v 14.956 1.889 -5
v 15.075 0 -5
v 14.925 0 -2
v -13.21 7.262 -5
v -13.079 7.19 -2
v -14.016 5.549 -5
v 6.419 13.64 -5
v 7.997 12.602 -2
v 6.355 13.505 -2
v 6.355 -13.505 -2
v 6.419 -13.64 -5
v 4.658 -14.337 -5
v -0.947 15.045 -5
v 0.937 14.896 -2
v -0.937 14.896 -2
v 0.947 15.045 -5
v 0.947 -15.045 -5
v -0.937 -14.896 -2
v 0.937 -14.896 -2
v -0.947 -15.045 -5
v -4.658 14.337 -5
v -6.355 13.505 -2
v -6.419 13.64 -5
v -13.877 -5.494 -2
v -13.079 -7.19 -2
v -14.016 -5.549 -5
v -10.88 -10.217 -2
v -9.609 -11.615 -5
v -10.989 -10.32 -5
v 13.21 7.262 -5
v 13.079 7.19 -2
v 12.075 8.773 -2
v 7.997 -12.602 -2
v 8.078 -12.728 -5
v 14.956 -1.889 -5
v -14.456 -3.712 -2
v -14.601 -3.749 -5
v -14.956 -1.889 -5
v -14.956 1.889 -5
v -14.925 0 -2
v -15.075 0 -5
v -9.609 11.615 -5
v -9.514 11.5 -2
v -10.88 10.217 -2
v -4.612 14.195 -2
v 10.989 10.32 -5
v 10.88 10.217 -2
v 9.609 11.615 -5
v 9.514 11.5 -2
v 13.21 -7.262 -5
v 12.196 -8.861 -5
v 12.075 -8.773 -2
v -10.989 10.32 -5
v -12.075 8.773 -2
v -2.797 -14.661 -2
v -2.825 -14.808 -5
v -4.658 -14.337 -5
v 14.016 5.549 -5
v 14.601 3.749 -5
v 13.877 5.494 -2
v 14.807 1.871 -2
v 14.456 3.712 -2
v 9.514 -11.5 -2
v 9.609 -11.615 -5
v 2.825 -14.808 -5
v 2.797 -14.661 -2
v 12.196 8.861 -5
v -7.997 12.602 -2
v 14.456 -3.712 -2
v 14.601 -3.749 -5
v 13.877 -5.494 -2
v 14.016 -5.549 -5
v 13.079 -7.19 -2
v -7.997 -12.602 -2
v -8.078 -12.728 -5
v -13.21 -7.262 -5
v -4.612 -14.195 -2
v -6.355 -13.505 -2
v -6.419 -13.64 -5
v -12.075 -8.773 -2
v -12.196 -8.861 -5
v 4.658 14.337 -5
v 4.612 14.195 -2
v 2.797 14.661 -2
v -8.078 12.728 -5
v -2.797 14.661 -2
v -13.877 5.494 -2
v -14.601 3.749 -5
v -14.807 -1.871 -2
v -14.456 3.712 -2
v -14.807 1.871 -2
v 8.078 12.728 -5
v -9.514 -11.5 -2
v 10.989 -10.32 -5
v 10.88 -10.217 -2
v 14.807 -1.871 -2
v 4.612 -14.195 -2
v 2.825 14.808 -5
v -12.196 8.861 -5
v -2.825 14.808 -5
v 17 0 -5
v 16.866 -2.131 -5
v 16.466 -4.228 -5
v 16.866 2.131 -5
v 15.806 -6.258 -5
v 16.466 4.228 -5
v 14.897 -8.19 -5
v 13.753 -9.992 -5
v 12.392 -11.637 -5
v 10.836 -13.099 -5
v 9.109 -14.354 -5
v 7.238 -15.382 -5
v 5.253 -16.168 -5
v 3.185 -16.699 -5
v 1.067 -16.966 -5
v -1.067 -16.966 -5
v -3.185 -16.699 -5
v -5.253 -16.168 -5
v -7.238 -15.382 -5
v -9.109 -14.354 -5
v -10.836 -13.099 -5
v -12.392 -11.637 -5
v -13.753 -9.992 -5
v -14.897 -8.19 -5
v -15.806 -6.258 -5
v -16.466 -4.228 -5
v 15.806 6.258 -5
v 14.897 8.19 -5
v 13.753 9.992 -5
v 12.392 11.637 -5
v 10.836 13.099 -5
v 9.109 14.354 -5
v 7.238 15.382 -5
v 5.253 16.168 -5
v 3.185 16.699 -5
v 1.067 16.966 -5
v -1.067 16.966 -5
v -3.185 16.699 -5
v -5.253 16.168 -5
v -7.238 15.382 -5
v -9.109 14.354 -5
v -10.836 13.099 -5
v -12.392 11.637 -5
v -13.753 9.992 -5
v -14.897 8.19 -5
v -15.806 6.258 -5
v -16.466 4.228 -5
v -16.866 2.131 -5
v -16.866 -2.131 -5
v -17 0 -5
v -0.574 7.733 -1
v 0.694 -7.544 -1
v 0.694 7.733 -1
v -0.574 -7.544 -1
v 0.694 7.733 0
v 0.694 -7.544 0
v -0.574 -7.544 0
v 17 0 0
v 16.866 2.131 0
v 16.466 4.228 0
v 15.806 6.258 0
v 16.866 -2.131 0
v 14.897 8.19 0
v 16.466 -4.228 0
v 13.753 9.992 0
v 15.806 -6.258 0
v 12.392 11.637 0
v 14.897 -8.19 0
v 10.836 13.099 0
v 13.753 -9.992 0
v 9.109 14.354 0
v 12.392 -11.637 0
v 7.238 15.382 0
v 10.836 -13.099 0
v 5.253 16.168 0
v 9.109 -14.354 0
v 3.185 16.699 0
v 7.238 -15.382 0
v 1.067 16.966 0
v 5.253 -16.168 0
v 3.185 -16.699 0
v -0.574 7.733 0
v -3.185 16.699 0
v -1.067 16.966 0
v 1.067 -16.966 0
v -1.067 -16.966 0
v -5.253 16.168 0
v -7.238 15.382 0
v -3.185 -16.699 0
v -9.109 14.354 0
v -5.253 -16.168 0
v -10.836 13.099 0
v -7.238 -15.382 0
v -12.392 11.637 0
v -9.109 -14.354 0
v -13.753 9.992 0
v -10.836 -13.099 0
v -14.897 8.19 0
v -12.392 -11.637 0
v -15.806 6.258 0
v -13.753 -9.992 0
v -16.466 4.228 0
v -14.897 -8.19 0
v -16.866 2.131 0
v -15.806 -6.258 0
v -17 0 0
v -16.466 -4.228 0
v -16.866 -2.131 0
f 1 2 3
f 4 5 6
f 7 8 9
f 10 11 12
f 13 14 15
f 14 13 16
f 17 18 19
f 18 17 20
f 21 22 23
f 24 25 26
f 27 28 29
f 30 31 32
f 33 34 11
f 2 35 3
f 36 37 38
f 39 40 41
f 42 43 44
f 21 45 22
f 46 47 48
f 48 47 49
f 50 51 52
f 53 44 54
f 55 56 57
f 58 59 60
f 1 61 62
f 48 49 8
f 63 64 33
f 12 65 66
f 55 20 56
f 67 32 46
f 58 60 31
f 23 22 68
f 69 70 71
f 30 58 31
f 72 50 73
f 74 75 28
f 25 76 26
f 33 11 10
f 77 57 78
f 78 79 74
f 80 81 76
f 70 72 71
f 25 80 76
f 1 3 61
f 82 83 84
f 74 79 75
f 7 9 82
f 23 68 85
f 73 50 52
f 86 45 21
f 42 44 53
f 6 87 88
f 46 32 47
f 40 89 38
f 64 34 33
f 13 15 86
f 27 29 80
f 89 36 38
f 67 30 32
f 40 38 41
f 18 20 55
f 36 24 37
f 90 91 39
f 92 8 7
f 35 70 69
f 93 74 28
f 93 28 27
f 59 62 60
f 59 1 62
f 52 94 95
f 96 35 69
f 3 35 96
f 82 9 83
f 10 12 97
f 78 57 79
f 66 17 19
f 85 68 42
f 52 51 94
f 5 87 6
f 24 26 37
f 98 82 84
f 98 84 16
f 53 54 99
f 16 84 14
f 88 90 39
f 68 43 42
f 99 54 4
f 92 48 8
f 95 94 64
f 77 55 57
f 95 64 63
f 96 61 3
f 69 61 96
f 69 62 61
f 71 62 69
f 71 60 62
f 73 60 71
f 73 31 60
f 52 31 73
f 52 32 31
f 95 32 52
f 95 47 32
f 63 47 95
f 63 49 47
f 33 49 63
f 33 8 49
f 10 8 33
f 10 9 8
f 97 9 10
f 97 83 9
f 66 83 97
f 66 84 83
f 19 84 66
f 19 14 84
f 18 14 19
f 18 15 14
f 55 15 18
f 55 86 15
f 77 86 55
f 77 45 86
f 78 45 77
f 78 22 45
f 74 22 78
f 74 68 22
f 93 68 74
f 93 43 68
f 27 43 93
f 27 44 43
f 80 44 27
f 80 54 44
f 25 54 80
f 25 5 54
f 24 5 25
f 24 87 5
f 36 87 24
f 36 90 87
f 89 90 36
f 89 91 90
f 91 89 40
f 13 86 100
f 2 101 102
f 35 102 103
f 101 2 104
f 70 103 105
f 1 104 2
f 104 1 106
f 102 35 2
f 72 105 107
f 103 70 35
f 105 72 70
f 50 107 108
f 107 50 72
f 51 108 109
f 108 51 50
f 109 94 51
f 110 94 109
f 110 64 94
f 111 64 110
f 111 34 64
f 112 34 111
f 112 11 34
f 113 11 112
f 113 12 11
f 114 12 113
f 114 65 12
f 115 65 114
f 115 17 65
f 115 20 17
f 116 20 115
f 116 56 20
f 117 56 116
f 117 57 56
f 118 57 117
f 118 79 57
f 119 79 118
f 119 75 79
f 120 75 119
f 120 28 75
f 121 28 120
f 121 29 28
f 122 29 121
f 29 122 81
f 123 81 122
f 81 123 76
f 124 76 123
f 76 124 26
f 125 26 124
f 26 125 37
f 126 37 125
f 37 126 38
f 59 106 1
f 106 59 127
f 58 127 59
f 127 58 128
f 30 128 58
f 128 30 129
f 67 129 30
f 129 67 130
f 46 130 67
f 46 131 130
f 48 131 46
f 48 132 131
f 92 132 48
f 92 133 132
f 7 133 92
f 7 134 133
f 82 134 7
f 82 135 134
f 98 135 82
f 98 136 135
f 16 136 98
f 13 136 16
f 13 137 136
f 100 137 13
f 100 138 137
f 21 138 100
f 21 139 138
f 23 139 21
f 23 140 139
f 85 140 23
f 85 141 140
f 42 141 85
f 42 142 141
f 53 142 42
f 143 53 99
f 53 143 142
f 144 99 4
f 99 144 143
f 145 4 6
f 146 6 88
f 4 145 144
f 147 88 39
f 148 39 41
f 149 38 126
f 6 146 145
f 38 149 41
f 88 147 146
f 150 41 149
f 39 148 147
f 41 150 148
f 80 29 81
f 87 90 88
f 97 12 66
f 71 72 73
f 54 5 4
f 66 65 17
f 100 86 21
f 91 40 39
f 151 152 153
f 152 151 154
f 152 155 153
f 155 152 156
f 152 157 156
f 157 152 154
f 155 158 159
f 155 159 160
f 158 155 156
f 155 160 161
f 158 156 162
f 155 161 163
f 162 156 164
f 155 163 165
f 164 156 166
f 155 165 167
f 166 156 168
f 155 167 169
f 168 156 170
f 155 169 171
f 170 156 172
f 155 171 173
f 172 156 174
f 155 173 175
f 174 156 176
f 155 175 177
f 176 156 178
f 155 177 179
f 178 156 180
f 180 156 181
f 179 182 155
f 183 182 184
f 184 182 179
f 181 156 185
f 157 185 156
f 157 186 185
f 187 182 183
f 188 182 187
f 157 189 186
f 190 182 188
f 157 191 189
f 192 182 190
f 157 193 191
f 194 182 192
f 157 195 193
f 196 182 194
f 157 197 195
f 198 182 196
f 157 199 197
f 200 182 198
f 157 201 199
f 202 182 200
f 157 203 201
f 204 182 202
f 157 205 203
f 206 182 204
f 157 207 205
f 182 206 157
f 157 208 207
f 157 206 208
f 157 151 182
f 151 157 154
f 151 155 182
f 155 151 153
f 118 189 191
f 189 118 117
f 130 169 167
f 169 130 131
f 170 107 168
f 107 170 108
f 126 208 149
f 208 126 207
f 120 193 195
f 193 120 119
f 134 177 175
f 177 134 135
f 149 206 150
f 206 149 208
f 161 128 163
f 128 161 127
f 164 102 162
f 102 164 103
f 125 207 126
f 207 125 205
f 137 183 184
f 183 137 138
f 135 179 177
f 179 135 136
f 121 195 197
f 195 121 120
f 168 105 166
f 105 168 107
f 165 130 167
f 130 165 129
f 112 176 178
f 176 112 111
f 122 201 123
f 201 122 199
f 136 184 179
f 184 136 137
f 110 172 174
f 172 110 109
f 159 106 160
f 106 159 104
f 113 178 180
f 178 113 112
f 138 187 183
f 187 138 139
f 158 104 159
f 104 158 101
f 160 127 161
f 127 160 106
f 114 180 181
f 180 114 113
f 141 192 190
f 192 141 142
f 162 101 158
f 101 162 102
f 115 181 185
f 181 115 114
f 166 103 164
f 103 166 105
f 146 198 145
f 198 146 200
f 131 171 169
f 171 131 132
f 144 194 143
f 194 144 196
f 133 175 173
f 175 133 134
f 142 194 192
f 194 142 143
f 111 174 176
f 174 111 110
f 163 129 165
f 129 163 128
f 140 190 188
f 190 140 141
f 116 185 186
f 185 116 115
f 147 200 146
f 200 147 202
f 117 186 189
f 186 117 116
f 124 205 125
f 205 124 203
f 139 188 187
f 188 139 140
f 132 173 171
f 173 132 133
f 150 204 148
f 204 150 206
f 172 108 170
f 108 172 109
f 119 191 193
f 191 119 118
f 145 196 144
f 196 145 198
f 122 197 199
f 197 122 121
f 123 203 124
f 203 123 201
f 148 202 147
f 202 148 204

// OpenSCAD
$fn = 50;

difference() {
	union() {
		translate(v = [0, 0, -5.0]) {
			cylinder(h = 5, r = 17.0);
		}
	}
	union() {
		#translate(v = [0, 0, -5.0]) {
			cylinder(h = 3, r1 = 15.075, r2 = 14.925);
		}
		translate(v = [0, 0, -1]) {
			linear_extrude(height = 1) {
				text(font = "Wingdings", halign = "center", size = 11, text = "|", valign = "center");
			}
		}
	}
}
